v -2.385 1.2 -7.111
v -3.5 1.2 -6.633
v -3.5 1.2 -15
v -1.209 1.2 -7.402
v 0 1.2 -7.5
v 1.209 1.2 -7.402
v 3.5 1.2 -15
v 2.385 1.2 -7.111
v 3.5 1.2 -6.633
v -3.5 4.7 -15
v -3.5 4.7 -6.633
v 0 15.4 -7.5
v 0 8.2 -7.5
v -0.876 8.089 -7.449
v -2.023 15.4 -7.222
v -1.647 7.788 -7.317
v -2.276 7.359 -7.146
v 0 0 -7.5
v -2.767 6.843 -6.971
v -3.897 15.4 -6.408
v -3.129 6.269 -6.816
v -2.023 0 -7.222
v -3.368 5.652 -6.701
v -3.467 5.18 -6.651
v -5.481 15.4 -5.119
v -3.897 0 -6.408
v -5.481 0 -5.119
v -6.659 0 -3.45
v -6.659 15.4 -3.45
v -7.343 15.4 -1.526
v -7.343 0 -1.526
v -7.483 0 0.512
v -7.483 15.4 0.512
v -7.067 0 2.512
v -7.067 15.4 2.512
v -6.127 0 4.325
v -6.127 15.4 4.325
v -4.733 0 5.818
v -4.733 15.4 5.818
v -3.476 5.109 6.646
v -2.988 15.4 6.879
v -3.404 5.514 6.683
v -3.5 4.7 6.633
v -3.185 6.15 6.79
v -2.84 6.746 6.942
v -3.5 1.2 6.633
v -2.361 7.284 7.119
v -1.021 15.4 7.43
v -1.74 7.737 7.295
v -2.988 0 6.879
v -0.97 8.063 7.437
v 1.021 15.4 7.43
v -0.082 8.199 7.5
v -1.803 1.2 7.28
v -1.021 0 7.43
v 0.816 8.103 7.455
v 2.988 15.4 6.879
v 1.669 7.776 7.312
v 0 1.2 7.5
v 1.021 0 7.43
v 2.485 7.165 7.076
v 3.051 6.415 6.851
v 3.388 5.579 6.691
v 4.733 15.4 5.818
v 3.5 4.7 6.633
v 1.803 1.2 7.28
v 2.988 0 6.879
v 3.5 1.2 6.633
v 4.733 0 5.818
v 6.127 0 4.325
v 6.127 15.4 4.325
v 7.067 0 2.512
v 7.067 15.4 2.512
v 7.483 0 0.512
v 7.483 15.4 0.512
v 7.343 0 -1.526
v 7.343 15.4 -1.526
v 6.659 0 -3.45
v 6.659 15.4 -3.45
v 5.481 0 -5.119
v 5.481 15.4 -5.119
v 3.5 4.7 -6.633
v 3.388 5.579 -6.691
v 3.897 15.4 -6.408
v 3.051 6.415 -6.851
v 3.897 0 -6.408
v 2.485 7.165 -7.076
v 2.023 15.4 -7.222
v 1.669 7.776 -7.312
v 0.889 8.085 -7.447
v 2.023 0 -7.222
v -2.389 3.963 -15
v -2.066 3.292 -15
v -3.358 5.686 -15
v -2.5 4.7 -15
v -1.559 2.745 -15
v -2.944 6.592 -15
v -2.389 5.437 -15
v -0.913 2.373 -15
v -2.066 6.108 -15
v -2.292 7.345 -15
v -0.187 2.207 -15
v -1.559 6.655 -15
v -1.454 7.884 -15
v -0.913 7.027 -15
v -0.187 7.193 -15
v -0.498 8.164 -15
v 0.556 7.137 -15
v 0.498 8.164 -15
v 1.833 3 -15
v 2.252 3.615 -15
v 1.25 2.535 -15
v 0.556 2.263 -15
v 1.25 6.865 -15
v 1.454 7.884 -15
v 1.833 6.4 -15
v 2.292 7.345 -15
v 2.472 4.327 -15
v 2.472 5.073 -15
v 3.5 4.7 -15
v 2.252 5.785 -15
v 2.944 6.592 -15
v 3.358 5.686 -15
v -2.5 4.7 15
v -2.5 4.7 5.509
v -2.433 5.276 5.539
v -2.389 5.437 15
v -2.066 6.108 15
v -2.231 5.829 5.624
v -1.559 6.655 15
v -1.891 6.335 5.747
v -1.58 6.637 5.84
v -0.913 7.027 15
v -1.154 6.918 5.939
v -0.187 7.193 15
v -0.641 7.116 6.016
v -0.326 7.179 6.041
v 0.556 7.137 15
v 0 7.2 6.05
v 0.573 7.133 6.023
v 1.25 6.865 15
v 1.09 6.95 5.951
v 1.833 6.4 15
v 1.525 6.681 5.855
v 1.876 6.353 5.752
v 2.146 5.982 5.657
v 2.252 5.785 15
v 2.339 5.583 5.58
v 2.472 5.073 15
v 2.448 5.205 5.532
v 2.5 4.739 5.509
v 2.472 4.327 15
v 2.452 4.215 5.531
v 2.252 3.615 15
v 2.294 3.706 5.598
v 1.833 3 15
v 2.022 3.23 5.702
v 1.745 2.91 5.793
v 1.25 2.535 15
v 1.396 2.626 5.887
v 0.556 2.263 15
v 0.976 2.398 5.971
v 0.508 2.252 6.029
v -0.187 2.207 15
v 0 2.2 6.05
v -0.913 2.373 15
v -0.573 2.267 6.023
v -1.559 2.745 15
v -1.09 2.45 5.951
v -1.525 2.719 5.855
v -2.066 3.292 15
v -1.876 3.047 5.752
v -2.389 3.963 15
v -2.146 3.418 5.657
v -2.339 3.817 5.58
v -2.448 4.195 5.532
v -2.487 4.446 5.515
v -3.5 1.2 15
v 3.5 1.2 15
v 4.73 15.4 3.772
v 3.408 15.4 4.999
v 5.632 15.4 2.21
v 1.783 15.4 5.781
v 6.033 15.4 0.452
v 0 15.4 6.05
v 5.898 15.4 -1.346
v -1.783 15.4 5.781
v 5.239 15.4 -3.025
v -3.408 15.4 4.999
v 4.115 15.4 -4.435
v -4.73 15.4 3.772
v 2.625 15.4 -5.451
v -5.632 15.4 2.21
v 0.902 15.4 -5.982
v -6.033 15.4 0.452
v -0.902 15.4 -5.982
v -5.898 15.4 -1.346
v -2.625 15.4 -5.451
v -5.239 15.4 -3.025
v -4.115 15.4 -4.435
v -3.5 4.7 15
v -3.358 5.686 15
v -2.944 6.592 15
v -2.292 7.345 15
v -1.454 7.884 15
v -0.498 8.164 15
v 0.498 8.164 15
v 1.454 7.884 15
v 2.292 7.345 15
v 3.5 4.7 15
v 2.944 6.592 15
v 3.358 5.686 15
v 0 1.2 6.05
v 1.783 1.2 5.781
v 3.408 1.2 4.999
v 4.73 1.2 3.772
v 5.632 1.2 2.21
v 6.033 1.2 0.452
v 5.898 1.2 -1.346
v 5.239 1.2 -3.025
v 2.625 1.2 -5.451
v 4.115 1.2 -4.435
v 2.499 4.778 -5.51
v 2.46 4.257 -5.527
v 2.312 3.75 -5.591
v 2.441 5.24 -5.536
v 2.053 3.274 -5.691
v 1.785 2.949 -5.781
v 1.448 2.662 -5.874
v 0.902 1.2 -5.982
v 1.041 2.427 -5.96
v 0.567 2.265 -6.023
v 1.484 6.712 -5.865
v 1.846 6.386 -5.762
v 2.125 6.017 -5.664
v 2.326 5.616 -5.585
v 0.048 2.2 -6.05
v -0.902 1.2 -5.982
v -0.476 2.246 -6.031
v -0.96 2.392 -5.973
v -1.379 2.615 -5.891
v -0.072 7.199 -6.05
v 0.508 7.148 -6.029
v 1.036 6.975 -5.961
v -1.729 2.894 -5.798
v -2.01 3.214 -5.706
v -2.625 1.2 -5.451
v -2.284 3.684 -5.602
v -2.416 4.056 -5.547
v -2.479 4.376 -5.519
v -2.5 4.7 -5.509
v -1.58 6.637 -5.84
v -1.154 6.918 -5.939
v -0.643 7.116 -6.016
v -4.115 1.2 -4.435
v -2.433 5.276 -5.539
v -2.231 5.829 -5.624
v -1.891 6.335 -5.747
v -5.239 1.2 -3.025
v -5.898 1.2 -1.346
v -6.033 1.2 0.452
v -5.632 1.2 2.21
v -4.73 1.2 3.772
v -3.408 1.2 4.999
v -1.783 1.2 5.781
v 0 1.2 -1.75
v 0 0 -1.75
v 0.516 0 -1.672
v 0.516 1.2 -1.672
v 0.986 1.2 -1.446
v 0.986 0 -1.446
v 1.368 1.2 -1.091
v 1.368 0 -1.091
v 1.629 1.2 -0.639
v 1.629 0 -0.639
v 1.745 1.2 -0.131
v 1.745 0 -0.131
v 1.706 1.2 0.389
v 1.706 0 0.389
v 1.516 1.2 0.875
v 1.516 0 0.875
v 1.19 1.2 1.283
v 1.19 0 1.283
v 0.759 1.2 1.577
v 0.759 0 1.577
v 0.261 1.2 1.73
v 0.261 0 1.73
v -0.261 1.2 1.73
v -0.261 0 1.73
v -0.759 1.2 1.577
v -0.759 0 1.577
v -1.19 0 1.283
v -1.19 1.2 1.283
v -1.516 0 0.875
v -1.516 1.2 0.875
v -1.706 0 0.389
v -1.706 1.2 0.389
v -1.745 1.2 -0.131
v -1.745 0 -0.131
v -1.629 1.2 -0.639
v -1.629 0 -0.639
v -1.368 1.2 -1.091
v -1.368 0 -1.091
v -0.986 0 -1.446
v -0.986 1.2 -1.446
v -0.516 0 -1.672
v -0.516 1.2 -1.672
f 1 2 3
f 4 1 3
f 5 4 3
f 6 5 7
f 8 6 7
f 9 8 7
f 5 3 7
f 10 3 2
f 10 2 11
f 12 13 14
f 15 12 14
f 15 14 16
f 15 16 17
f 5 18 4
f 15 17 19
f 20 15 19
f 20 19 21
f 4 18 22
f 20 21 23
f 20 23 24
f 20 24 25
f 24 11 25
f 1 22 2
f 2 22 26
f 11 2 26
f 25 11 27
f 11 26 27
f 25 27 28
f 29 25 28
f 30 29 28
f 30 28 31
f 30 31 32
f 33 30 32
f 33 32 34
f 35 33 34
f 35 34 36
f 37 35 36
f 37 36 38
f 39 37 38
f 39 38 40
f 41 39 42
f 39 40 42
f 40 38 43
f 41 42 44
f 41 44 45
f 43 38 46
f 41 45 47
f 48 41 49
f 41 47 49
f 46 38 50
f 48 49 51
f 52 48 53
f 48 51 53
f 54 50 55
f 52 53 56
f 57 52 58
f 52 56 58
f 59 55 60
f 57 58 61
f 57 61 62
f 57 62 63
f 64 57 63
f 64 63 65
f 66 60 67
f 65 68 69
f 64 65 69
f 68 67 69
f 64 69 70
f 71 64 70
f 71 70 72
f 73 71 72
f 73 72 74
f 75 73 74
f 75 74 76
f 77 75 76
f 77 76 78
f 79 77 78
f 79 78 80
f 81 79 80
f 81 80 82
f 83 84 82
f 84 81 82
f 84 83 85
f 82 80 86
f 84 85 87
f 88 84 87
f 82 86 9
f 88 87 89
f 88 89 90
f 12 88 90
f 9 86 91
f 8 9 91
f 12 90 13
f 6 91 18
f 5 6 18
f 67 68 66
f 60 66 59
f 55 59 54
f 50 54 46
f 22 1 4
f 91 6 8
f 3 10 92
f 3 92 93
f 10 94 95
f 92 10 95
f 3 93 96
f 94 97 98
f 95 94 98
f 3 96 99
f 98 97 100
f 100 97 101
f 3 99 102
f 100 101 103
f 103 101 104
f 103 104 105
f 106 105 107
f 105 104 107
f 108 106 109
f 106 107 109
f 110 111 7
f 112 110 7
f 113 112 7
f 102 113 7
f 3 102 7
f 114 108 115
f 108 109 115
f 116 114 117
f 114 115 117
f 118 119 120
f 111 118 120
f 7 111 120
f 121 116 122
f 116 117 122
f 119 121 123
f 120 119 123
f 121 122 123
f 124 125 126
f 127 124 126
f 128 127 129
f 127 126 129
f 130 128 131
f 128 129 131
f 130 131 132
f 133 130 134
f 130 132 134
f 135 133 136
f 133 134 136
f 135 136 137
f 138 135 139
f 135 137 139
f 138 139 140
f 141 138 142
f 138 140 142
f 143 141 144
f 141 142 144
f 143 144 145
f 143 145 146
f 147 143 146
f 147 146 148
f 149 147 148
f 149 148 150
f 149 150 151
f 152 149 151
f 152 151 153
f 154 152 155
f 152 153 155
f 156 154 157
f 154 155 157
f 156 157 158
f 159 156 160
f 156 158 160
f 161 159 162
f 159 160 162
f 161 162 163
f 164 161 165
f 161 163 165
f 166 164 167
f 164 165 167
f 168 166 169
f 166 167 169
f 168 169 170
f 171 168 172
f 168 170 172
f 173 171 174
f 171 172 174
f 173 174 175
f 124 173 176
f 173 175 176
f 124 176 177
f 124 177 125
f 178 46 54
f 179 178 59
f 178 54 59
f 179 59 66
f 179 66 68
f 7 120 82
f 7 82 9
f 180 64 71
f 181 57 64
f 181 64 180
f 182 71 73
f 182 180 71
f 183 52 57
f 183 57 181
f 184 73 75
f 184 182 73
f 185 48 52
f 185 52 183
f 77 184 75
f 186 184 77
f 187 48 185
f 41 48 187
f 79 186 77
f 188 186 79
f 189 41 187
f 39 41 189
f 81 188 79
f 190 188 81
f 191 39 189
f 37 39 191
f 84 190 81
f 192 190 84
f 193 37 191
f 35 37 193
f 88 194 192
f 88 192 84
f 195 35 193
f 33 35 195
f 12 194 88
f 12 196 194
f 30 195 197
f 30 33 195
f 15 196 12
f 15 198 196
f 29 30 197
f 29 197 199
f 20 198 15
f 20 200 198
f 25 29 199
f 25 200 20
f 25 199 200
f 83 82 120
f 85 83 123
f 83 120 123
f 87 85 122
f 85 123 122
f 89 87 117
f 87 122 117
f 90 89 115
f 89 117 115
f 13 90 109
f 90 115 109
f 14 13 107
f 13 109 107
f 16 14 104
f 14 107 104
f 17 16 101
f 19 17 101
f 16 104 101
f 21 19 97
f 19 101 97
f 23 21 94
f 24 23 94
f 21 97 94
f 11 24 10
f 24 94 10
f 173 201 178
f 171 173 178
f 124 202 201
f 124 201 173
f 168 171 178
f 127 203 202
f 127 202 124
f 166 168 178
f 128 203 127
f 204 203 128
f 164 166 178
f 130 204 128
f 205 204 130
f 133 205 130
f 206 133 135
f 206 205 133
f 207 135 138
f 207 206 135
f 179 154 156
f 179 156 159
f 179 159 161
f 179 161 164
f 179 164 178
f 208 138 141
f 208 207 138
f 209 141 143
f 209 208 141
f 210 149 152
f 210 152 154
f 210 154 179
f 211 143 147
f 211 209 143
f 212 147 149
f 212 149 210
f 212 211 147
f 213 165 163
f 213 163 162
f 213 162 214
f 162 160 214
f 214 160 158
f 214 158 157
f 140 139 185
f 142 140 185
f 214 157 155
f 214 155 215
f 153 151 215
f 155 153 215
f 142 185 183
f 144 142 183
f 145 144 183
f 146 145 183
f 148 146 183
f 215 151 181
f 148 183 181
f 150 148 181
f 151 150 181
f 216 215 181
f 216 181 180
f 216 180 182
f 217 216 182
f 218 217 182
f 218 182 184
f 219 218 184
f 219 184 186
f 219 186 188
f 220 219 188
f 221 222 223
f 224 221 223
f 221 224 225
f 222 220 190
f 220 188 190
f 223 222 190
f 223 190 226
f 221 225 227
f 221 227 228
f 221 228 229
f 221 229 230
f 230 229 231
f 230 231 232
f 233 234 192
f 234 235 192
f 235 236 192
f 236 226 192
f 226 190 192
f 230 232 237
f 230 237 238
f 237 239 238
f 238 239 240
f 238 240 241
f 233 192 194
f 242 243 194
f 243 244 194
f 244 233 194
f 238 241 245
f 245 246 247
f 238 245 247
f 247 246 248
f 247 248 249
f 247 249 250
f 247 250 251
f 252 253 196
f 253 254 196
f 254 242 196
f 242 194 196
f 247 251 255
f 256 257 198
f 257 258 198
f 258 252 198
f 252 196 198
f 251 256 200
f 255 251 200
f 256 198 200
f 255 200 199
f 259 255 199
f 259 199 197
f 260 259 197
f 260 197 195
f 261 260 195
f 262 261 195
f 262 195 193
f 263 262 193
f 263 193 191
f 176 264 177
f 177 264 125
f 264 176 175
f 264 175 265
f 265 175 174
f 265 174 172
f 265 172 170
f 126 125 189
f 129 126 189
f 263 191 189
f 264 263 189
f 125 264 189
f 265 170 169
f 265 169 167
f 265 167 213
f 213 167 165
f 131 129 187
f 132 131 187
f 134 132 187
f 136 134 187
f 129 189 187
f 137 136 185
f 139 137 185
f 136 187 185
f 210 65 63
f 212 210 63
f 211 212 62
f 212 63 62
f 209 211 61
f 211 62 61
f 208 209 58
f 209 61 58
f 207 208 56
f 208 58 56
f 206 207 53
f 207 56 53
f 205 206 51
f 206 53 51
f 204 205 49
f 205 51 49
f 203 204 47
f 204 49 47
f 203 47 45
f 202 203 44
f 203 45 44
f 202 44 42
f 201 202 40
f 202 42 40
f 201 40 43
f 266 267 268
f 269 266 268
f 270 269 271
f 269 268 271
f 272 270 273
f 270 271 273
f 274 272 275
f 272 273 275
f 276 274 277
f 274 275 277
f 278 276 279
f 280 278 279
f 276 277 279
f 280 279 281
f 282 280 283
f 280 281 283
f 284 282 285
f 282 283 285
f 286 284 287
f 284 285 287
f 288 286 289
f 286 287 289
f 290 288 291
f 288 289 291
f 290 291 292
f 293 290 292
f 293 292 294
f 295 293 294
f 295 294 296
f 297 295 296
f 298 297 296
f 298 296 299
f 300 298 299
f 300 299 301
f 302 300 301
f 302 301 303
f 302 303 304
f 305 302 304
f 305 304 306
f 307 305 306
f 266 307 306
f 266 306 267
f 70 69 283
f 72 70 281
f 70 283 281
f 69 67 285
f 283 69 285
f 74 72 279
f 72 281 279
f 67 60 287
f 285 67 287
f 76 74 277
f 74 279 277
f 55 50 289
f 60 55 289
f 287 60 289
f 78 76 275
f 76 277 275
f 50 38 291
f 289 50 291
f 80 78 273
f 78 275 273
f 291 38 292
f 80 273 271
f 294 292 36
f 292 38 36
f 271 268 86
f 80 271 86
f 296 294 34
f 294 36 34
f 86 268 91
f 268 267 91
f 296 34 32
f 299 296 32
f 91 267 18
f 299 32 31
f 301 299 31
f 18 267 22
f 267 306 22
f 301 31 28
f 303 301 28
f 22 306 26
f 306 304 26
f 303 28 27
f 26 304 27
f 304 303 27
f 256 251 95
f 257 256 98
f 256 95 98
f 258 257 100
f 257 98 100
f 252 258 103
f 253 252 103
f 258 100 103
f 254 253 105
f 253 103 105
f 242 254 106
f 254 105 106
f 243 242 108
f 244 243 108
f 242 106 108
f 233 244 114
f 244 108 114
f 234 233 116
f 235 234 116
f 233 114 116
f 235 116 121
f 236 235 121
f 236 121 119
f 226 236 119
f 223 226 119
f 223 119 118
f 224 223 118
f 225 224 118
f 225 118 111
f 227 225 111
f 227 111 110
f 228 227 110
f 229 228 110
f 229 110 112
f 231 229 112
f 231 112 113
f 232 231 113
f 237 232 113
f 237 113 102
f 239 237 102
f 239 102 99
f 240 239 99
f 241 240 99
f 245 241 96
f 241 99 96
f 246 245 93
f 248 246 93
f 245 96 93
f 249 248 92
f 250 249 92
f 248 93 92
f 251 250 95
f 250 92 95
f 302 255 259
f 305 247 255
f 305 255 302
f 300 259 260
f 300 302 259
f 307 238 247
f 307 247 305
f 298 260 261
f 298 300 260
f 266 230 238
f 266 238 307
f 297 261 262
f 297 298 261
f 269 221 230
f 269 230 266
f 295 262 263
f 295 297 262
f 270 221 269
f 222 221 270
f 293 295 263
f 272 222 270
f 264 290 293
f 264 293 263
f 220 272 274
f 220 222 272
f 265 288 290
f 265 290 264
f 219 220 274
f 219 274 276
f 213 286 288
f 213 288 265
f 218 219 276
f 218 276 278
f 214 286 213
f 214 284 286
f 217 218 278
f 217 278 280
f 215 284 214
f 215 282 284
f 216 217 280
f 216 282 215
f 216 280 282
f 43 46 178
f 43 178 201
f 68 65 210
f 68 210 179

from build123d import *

# Parameters (mm, degrees)
SKETCH1_R             = 7.5
BASE_CYLINDER_DEPTH   = 15.4
LED_HOLDER_DEPTH      = 7.5
LED_HOLDER_DEPTH_BACK = 22.5
F_3DSKETCH2_R         = 3.5
SKETCH2_R             = 6.05
CUT_EXTRUDE1_DEPTH    = 14.2
CUT_EXTRUDE2_REACH    = 24.769
SKETCH3_R             = 1.75
SKETCH4_R             = 2.5
CUT_EXTRUDE3_DEPTH    = 35.545766898


with BuildPart() as part:
    # Sketch1 → base-cylinder (new body)
    with BuildSketch(Plane(origin=(0, 0, 0), x_dir=(1, 0, 0), z_dir=(0, 1, 0))):
        with Locations(Location((0, 0, 0), (0, 0, 90))):
            Circle(SKETCH1_R)
    extrude(amount=BASE_CYLINDER_DEPTH)

    # 3DSketch2 → led-holder (add, two sides: drawn at the far end of the back side and taken through both)
    with BuildSketch(Plane(origin=(-3.5, 4.7, 7.5), x_dir=(0.894427190999916, -0.44721359549995804, 0), z_dir=(0, 0, 1)).offset(-LED_HOLDER_DEPTH_BACK)):
        with Locations((3.130495168, 1.565247584)):
            Circle(F_3DSKETCH2_R)
        Polygon((0, 0), (6.260990337, 3.130495168), (7.826237921, 0), (1.565247584, -3.130495168), align=None)
    extrude(amount=LED_HOLDER_DEPTH + LED_HOLDER_DEPTH_BACK)

    # Sketch2 → Cut-Extrude1 (cut)
    with BuildSketch(Plane(origin=(0, 15.4, 0), x_dir=(1, 0, 0), z_dir=(0, 1, 0))):
        with Locations(Location((0, 0, 0), (0, 0, 270))):
            Circle(SKETCH2_R)
    extrude(amount=-CUT_EXTRUDE1_DEPTH, mode=Mode.SUBTRACT)

    # Sketch3 → Cut-Extrude2 (cut, up to next)
    with BuildSketch(Plane.XZ, mode=Mode.PRIVATE) as cut_extrude2_sk1:
        with Locations(Location((0, 0, 0), (0, 0, 270))):
            Circle(SKETCH3_R)
    cut_extrude2_tool1 = extrude(cut_extrude2_sk1.sketch, amount=-CUT_EXTRUDE2_REACH, mode=Mode.PRIVATE) & part.part
    add(cut_extrude2_tool1.solids().sort_by_distance((0, 0, 0))[0], mode=Mode.SUBTRACT)

    # Sketch4 → Cut-Extrude3 (cut, through all)
    with BuildSketch(Plane(origin=(0, 0, -15), x_dir=(-1, 0, 0), z_dir=(0, 0, -1))):
        with Locations((0, 4.7)):
            Circle(SKETCH4_R)
    extrude(amount=-CUT_EXTRUDE3_DEPTH, mode=Mode.SUBTRACT)


solid = part.part
